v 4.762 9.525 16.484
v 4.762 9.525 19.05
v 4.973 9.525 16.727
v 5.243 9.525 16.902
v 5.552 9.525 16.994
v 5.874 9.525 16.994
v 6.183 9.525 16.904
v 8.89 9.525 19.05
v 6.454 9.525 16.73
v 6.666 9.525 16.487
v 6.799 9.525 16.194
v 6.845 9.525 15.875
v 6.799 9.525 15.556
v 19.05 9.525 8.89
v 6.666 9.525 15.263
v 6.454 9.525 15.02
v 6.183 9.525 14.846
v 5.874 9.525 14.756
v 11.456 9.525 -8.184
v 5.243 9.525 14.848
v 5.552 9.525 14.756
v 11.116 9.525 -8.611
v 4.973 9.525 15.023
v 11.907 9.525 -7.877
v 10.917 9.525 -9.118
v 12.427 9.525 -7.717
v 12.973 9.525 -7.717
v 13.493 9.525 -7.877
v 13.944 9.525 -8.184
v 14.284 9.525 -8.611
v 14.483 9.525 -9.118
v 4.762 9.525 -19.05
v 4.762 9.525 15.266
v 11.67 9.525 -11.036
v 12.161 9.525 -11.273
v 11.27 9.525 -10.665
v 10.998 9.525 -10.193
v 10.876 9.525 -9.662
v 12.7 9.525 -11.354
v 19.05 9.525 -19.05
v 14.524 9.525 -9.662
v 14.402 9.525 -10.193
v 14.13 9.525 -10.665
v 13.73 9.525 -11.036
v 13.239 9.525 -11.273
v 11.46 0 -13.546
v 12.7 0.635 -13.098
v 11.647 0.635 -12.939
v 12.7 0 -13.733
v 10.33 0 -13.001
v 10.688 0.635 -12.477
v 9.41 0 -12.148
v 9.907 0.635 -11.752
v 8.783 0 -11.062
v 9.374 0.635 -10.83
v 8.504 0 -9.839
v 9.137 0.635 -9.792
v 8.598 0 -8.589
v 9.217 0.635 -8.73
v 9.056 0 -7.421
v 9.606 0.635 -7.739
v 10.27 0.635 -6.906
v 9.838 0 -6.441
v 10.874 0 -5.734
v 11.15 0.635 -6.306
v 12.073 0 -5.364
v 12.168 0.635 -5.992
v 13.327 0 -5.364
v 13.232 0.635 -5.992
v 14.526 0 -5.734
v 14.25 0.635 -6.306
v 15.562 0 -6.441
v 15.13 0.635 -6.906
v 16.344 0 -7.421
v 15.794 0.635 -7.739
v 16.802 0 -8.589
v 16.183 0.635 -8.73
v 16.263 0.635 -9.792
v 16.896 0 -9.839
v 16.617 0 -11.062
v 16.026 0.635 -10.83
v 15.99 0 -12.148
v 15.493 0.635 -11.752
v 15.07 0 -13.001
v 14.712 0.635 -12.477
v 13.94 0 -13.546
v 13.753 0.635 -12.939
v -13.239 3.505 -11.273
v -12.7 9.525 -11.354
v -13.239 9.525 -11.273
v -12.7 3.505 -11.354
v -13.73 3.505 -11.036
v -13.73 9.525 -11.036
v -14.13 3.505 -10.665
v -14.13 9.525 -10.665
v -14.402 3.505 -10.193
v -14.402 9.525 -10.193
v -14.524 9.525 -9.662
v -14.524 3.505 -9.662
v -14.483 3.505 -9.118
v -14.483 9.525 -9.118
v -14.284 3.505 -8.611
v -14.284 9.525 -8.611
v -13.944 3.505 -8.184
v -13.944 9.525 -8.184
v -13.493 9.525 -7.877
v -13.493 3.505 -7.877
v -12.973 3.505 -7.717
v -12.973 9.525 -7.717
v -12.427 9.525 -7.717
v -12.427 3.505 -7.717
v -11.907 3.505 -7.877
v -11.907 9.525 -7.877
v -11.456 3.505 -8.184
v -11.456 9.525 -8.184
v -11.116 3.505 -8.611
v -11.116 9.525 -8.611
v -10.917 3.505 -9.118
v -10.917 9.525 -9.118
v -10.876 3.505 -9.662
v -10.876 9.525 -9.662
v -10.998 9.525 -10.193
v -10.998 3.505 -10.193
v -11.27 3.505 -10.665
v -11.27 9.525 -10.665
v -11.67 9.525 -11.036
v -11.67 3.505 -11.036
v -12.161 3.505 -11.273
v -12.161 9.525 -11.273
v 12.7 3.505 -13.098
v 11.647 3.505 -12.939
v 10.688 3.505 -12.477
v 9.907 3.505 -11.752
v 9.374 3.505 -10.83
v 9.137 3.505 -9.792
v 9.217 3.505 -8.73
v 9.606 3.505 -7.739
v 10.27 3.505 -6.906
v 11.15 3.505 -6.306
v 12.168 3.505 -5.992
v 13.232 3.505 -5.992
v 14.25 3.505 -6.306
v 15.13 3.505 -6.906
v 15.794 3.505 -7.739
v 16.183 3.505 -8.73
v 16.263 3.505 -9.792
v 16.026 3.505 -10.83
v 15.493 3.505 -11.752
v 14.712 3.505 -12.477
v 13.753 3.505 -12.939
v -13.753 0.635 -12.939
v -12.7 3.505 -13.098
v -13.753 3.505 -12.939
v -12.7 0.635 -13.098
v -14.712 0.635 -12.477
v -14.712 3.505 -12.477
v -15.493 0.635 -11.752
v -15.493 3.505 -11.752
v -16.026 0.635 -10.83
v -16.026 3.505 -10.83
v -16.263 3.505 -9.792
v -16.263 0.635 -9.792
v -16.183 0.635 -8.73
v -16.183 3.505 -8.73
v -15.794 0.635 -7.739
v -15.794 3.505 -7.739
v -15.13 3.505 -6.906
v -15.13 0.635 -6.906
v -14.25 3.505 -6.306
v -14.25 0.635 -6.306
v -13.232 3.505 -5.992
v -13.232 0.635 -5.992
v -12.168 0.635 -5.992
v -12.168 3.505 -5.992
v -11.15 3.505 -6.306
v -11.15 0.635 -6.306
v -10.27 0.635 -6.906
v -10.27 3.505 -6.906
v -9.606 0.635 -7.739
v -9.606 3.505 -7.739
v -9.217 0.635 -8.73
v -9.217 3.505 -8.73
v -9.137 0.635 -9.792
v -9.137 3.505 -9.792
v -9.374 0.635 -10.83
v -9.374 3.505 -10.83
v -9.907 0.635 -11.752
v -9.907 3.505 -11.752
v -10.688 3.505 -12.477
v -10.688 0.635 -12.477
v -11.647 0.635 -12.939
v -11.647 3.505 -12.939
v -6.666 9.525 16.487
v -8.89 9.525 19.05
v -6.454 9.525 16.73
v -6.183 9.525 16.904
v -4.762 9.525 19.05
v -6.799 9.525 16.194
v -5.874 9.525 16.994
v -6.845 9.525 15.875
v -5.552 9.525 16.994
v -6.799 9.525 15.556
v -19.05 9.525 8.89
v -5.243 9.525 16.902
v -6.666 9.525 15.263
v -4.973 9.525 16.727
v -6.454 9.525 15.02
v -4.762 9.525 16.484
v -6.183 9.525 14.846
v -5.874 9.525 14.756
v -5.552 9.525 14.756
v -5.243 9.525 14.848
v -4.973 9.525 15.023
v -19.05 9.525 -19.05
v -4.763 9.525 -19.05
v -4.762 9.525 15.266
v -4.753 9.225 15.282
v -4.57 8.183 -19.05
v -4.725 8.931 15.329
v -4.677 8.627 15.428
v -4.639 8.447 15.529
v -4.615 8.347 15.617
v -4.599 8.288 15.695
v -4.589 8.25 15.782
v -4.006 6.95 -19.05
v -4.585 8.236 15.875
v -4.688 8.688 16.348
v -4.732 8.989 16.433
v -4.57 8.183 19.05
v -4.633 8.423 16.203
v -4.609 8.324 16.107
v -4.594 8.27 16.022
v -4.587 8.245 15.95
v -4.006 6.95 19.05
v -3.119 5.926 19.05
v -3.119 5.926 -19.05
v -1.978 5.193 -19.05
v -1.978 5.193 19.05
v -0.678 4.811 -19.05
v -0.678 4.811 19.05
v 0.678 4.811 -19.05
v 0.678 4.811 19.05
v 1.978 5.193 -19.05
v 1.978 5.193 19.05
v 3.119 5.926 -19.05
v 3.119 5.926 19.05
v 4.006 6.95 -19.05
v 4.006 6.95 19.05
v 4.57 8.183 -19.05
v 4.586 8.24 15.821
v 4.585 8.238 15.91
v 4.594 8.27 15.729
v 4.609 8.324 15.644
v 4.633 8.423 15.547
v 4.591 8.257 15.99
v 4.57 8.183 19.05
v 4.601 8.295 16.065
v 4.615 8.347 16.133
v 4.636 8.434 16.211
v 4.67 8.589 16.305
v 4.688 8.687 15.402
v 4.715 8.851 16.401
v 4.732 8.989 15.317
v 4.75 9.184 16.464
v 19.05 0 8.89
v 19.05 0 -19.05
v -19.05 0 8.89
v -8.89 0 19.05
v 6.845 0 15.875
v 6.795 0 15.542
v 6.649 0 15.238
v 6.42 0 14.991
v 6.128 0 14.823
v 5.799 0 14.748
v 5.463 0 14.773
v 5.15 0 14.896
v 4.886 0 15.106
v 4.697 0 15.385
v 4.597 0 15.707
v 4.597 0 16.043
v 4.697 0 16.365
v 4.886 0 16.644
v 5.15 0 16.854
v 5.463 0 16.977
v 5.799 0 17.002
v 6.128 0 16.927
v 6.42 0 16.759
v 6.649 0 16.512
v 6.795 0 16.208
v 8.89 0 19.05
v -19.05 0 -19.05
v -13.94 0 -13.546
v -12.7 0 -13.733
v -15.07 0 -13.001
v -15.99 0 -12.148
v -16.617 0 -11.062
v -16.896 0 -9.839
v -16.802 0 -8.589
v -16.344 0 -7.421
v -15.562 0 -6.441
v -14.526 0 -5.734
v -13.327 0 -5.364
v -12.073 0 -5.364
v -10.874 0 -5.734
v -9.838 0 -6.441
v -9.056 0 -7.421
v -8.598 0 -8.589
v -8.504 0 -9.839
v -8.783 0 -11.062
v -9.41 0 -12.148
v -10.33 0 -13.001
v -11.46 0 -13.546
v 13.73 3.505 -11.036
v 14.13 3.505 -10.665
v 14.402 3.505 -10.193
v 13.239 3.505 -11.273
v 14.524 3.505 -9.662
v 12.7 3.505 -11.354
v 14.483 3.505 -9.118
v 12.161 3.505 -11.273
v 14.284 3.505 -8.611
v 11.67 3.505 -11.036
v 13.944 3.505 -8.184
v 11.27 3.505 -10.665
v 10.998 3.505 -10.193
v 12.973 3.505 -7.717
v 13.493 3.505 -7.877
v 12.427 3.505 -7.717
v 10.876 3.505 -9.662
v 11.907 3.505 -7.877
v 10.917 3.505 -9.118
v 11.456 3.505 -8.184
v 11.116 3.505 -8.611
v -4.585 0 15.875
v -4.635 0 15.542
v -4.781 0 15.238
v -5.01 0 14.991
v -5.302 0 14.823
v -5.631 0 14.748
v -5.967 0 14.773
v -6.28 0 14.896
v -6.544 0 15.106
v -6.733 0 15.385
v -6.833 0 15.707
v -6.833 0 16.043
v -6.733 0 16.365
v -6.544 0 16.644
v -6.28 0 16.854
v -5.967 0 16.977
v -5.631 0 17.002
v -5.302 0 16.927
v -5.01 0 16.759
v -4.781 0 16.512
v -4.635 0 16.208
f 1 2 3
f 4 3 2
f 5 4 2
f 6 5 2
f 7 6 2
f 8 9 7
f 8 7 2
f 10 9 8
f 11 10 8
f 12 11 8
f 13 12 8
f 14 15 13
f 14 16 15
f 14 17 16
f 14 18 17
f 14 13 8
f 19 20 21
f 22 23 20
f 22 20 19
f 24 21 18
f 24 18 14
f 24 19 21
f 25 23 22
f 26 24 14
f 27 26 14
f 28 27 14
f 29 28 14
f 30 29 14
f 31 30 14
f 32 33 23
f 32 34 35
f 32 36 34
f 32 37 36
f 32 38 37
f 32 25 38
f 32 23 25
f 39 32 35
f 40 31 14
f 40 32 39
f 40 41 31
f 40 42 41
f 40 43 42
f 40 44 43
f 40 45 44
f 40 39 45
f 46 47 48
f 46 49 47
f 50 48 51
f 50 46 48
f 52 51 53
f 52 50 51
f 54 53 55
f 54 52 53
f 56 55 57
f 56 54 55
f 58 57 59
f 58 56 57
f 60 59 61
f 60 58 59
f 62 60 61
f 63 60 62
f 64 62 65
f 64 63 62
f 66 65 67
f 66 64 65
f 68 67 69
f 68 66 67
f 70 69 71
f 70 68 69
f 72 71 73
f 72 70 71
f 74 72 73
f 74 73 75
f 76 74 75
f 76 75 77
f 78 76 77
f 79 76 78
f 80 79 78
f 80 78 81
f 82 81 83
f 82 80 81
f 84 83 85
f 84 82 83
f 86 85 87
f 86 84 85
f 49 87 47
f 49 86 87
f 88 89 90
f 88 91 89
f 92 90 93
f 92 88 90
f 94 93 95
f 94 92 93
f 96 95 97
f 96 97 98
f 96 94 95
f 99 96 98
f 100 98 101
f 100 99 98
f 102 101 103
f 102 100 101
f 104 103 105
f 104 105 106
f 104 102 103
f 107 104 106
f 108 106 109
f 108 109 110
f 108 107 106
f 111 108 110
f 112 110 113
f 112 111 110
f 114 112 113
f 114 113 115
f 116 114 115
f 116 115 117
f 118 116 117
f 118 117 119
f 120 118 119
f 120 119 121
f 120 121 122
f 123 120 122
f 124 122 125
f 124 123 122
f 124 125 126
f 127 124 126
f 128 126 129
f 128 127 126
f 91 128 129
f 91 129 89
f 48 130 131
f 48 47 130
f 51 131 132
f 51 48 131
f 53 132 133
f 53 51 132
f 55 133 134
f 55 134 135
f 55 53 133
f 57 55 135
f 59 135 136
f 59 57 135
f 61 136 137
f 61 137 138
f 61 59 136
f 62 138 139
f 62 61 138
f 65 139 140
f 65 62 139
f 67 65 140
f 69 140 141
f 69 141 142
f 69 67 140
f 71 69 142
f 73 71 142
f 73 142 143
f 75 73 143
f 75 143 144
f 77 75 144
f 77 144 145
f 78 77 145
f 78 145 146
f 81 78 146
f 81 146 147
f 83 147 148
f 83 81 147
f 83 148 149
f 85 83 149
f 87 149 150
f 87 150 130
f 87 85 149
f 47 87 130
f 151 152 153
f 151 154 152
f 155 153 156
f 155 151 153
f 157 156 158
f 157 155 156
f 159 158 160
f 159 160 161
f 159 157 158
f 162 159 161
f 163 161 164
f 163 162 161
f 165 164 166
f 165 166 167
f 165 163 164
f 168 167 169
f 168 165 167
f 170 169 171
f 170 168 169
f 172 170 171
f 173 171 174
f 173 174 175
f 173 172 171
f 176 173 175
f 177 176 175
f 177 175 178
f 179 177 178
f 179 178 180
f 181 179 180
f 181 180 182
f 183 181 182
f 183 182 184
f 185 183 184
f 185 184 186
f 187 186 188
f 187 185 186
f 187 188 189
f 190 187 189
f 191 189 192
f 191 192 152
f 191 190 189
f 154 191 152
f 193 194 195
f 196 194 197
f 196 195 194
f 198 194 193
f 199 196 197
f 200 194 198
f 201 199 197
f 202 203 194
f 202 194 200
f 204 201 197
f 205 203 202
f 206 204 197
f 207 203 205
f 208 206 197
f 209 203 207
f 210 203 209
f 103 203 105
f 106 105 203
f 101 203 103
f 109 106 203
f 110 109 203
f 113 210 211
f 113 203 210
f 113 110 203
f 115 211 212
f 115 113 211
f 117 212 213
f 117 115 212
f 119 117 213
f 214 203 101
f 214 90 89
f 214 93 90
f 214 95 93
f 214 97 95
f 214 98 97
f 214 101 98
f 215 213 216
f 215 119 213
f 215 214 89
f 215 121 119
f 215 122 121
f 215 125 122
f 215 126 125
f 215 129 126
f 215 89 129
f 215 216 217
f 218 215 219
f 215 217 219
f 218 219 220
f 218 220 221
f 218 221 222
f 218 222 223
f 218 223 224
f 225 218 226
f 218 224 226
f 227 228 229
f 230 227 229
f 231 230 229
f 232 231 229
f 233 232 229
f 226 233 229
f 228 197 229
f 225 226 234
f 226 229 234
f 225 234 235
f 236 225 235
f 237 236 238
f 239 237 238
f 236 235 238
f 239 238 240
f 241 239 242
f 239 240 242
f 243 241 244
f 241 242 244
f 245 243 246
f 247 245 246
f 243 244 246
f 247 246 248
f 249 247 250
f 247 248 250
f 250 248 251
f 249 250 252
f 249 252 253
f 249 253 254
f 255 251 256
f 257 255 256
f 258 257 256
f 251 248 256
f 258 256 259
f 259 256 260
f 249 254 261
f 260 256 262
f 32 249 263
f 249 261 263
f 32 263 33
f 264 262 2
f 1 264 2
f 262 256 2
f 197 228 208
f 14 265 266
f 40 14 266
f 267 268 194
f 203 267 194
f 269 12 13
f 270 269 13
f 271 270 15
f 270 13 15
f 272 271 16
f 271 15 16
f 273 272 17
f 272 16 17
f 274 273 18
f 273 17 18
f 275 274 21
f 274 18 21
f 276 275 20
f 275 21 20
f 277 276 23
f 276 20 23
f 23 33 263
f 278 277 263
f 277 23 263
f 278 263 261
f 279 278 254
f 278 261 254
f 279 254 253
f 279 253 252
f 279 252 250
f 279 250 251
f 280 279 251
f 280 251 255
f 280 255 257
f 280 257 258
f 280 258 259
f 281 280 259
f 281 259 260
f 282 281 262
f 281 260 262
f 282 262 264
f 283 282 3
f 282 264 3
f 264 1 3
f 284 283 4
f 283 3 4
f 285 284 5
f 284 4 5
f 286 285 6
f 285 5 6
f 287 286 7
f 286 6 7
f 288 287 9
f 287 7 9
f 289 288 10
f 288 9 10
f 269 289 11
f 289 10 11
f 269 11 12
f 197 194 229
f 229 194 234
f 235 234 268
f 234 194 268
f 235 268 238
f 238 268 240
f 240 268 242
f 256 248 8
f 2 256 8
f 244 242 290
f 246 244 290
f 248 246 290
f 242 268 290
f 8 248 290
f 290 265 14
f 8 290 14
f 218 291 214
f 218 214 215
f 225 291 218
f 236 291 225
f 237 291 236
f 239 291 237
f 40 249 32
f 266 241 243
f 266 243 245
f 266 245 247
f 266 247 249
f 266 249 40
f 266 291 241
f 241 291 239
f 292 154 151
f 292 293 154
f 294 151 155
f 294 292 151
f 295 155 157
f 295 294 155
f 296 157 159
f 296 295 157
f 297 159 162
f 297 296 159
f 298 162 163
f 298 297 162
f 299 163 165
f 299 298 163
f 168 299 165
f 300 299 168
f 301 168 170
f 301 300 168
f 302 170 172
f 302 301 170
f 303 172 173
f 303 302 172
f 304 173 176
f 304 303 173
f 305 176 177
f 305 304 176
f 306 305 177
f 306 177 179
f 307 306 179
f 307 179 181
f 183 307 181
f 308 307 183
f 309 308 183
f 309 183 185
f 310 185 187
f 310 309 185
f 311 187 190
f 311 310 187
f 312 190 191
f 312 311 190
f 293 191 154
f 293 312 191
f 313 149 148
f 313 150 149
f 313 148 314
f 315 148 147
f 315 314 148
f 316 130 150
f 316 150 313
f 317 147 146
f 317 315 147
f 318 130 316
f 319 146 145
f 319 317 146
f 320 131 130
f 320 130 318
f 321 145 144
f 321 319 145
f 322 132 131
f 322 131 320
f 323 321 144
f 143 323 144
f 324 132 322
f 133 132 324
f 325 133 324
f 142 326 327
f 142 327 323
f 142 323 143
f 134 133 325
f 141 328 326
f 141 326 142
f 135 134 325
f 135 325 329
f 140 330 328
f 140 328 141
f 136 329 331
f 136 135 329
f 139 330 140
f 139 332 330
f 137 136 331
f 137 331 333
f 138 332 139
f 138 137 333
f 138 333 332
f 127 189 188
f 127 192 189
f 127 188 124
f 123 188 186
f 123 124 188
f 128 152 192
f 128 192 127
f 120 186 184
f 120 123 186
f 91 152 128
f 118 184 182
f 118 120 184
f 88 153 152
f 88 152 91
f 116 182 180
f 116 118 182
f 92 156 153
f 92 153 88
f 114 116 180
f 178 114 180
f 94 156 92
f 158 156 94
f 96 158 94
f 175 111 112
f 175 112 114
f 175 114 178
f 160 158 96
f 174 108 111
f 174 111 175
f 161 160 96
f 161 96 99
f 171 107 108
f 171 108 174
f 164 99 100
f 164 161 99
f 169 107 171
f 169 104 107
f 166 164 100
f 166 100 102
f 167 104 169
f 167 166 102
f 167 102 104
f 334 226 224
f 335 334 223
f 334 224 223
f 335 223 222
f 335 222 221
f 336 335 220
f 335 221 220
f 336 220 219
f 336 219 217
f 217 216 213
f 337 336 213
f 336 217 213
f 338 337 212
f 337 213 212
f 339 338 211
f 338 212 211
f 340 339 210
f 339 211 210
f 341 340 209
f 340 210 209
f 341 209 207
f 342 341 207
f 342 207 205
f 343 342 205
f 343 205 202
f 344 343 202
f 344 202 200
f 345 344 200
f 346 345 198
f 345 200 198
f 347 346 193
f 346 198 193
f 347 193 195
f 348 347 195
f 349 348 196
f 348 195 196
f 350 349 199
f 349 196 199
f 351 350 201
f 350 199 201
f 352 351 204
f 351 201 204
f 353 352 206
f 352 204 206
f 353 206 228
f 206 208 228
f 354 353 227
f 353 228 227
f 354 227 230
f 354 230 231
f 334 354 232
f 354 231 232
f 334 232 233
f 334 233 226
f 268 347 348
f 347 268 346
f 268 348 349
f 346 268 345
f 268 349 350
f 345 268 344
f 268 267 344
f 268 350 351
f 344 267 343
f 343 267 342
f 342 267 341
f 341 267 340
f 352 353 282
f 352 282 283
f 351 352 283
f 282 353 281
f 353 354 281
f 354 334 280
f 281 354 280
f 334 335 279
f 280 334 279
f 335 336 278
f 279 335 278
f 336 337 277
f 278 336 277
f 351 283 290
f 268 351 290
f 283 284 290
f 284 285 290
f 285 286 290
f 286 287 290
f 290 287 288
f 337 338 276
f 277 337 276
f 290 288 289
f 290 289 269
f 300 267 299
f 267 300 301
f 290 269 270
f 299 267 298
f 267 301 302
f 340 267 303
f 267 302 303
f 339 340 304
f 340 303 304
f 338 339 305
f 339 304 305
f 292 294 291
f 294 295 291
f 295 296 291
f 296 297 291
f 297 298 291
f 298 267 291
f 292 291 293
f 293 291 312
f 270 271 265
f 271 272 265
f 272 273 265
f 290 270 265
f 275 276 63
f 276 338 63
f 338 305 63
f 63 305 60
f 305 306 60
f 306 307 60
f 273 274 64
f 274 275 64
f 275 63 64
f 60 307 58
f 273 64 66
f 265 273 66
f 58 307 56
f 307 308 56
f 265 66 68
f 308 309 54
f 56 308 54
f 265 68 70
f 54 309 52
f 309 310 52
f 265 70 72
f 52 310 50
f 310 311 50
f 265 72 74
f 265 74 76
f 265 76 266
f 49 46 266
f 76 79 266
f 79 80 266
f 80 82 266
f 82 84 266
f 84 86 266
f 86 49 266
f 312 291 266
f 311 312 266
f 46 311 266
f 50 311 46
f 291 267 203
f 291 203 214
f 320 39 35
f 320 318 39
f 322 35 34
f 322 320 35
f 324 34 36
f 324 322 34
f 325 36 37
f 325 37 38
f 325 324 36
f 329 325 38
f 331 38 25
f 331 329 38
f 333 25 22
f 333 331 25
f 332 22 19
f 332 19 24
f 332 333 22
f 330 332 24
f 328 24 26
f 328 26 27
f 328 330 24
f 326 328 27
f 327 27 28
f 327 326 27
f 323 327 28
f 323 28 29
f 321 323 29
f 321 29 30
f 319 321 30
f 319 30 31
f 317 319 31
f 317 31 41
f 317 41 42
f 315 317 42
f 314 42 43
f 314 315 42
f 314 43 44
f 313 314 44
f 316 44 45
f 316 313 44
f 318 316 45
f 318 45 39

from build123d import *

# Parameters (mm, degrees)
SKETCH1_W                                     = 38.1
SKETCH1_H                                     = 38.1
BOSS_EXTRUDE1_DEPTH                           = 9.525
SKETCH4_R                                     = 4.7625
CUT_EXTRUDE1_DEPTH                            = 44.649033494
MOTORHOLES_D                                  = 2.2606
CBORE_FOR_6_SOCKET_HEAD_CAP_SCREW1_AT_2_COUNT = 2
CBORE_FOR_6_SOCKET_HEAD_CAP_SCREW1_AT_2_PITCH = 25.4
CHAMFER1_SIZE                                 = 10.16


with BuildPart() as part:
    # Sketch1 → Boss-Extrude1 (new body)
    with BuildSketch(Plane(origin=(0, 0, 0), x_dir=(1, 0, 0), z_dir=(0, 1, 0))):
        Rectangle(SKETCH1_W, SKETCH1_H)
    extrude(amount=BOSS_EXTRUDE1_DEPTH)

    # Sketch4 → Cut-Extrude1 (cut, through all)
    with BuildSketch(Plane.XY.offset(19.05)):
        with Locations((0, 9.525)):
            Circle(SKETCH4_R)
    extrude(amount=-CUT_EXTRUDE1_DEPTH, mode=Mode.SUBTRACT)

    # MotorHoles (through all)
    with Locations(Plane(origin=(0, 0, 0), x_dir=(-1, 0, 0), z_dir=(0, -1, 0))):
        with Locations((-5.715, -15.875), (5.715, -15.875)):
            Hole(MOTORHOLES_D / 2)

    # Sketch5 → CBORE for #6 Socket Head Cap Screw1 (revolve, cut)
    with BuildSketch(Plane(origin=(12.7, 0, -9.525), x_dir=(0, 0, -1), z_dir=(1, 0, 0))):
        Polygon((0, 0), (0, 9.525), (1.8288, 9.525), (1.8288, 3.5052), (3.57251, 3.5052), (3.57251, 0.635), (4.20751, 0), align=None)
    cbore_for_6_socket_head_cap_screw1 = revolve(axis=Axis((12.7, -6.35, -9.525), (0, 1, 0)), mode=Mode.SUBTRACT)

    # CBORE for #6 Socket Head Cap Screw1 at 2: CBORE for #6 Socket Head Cap Screw1 ×2
    with Locations(*[(-i * CBORE_FOR_6_SOCKET_HEAD_CAP_SCREW1_AT_2_PITCH, 0, 0) for i in range(1, CBORE_FOR_6_SOCKET_HEAD_CAP_SCREW1_AT_2_COUNT)]):
        add(cbore_for_6_socket_head_cap_screw1, mode=Mode.SUBTRACT)

    # Chamfer1
    chamfer1_edges = [part.edges().sort_by_distance(p)[0] for p in [
        (19.05, 4.7625, 19.05),
        (-19.05, 4.7625, 19.05),
    ]]
    chamfer(chamfer1_edges, length=CHAMFER1_SIZE)


solid = part.part
